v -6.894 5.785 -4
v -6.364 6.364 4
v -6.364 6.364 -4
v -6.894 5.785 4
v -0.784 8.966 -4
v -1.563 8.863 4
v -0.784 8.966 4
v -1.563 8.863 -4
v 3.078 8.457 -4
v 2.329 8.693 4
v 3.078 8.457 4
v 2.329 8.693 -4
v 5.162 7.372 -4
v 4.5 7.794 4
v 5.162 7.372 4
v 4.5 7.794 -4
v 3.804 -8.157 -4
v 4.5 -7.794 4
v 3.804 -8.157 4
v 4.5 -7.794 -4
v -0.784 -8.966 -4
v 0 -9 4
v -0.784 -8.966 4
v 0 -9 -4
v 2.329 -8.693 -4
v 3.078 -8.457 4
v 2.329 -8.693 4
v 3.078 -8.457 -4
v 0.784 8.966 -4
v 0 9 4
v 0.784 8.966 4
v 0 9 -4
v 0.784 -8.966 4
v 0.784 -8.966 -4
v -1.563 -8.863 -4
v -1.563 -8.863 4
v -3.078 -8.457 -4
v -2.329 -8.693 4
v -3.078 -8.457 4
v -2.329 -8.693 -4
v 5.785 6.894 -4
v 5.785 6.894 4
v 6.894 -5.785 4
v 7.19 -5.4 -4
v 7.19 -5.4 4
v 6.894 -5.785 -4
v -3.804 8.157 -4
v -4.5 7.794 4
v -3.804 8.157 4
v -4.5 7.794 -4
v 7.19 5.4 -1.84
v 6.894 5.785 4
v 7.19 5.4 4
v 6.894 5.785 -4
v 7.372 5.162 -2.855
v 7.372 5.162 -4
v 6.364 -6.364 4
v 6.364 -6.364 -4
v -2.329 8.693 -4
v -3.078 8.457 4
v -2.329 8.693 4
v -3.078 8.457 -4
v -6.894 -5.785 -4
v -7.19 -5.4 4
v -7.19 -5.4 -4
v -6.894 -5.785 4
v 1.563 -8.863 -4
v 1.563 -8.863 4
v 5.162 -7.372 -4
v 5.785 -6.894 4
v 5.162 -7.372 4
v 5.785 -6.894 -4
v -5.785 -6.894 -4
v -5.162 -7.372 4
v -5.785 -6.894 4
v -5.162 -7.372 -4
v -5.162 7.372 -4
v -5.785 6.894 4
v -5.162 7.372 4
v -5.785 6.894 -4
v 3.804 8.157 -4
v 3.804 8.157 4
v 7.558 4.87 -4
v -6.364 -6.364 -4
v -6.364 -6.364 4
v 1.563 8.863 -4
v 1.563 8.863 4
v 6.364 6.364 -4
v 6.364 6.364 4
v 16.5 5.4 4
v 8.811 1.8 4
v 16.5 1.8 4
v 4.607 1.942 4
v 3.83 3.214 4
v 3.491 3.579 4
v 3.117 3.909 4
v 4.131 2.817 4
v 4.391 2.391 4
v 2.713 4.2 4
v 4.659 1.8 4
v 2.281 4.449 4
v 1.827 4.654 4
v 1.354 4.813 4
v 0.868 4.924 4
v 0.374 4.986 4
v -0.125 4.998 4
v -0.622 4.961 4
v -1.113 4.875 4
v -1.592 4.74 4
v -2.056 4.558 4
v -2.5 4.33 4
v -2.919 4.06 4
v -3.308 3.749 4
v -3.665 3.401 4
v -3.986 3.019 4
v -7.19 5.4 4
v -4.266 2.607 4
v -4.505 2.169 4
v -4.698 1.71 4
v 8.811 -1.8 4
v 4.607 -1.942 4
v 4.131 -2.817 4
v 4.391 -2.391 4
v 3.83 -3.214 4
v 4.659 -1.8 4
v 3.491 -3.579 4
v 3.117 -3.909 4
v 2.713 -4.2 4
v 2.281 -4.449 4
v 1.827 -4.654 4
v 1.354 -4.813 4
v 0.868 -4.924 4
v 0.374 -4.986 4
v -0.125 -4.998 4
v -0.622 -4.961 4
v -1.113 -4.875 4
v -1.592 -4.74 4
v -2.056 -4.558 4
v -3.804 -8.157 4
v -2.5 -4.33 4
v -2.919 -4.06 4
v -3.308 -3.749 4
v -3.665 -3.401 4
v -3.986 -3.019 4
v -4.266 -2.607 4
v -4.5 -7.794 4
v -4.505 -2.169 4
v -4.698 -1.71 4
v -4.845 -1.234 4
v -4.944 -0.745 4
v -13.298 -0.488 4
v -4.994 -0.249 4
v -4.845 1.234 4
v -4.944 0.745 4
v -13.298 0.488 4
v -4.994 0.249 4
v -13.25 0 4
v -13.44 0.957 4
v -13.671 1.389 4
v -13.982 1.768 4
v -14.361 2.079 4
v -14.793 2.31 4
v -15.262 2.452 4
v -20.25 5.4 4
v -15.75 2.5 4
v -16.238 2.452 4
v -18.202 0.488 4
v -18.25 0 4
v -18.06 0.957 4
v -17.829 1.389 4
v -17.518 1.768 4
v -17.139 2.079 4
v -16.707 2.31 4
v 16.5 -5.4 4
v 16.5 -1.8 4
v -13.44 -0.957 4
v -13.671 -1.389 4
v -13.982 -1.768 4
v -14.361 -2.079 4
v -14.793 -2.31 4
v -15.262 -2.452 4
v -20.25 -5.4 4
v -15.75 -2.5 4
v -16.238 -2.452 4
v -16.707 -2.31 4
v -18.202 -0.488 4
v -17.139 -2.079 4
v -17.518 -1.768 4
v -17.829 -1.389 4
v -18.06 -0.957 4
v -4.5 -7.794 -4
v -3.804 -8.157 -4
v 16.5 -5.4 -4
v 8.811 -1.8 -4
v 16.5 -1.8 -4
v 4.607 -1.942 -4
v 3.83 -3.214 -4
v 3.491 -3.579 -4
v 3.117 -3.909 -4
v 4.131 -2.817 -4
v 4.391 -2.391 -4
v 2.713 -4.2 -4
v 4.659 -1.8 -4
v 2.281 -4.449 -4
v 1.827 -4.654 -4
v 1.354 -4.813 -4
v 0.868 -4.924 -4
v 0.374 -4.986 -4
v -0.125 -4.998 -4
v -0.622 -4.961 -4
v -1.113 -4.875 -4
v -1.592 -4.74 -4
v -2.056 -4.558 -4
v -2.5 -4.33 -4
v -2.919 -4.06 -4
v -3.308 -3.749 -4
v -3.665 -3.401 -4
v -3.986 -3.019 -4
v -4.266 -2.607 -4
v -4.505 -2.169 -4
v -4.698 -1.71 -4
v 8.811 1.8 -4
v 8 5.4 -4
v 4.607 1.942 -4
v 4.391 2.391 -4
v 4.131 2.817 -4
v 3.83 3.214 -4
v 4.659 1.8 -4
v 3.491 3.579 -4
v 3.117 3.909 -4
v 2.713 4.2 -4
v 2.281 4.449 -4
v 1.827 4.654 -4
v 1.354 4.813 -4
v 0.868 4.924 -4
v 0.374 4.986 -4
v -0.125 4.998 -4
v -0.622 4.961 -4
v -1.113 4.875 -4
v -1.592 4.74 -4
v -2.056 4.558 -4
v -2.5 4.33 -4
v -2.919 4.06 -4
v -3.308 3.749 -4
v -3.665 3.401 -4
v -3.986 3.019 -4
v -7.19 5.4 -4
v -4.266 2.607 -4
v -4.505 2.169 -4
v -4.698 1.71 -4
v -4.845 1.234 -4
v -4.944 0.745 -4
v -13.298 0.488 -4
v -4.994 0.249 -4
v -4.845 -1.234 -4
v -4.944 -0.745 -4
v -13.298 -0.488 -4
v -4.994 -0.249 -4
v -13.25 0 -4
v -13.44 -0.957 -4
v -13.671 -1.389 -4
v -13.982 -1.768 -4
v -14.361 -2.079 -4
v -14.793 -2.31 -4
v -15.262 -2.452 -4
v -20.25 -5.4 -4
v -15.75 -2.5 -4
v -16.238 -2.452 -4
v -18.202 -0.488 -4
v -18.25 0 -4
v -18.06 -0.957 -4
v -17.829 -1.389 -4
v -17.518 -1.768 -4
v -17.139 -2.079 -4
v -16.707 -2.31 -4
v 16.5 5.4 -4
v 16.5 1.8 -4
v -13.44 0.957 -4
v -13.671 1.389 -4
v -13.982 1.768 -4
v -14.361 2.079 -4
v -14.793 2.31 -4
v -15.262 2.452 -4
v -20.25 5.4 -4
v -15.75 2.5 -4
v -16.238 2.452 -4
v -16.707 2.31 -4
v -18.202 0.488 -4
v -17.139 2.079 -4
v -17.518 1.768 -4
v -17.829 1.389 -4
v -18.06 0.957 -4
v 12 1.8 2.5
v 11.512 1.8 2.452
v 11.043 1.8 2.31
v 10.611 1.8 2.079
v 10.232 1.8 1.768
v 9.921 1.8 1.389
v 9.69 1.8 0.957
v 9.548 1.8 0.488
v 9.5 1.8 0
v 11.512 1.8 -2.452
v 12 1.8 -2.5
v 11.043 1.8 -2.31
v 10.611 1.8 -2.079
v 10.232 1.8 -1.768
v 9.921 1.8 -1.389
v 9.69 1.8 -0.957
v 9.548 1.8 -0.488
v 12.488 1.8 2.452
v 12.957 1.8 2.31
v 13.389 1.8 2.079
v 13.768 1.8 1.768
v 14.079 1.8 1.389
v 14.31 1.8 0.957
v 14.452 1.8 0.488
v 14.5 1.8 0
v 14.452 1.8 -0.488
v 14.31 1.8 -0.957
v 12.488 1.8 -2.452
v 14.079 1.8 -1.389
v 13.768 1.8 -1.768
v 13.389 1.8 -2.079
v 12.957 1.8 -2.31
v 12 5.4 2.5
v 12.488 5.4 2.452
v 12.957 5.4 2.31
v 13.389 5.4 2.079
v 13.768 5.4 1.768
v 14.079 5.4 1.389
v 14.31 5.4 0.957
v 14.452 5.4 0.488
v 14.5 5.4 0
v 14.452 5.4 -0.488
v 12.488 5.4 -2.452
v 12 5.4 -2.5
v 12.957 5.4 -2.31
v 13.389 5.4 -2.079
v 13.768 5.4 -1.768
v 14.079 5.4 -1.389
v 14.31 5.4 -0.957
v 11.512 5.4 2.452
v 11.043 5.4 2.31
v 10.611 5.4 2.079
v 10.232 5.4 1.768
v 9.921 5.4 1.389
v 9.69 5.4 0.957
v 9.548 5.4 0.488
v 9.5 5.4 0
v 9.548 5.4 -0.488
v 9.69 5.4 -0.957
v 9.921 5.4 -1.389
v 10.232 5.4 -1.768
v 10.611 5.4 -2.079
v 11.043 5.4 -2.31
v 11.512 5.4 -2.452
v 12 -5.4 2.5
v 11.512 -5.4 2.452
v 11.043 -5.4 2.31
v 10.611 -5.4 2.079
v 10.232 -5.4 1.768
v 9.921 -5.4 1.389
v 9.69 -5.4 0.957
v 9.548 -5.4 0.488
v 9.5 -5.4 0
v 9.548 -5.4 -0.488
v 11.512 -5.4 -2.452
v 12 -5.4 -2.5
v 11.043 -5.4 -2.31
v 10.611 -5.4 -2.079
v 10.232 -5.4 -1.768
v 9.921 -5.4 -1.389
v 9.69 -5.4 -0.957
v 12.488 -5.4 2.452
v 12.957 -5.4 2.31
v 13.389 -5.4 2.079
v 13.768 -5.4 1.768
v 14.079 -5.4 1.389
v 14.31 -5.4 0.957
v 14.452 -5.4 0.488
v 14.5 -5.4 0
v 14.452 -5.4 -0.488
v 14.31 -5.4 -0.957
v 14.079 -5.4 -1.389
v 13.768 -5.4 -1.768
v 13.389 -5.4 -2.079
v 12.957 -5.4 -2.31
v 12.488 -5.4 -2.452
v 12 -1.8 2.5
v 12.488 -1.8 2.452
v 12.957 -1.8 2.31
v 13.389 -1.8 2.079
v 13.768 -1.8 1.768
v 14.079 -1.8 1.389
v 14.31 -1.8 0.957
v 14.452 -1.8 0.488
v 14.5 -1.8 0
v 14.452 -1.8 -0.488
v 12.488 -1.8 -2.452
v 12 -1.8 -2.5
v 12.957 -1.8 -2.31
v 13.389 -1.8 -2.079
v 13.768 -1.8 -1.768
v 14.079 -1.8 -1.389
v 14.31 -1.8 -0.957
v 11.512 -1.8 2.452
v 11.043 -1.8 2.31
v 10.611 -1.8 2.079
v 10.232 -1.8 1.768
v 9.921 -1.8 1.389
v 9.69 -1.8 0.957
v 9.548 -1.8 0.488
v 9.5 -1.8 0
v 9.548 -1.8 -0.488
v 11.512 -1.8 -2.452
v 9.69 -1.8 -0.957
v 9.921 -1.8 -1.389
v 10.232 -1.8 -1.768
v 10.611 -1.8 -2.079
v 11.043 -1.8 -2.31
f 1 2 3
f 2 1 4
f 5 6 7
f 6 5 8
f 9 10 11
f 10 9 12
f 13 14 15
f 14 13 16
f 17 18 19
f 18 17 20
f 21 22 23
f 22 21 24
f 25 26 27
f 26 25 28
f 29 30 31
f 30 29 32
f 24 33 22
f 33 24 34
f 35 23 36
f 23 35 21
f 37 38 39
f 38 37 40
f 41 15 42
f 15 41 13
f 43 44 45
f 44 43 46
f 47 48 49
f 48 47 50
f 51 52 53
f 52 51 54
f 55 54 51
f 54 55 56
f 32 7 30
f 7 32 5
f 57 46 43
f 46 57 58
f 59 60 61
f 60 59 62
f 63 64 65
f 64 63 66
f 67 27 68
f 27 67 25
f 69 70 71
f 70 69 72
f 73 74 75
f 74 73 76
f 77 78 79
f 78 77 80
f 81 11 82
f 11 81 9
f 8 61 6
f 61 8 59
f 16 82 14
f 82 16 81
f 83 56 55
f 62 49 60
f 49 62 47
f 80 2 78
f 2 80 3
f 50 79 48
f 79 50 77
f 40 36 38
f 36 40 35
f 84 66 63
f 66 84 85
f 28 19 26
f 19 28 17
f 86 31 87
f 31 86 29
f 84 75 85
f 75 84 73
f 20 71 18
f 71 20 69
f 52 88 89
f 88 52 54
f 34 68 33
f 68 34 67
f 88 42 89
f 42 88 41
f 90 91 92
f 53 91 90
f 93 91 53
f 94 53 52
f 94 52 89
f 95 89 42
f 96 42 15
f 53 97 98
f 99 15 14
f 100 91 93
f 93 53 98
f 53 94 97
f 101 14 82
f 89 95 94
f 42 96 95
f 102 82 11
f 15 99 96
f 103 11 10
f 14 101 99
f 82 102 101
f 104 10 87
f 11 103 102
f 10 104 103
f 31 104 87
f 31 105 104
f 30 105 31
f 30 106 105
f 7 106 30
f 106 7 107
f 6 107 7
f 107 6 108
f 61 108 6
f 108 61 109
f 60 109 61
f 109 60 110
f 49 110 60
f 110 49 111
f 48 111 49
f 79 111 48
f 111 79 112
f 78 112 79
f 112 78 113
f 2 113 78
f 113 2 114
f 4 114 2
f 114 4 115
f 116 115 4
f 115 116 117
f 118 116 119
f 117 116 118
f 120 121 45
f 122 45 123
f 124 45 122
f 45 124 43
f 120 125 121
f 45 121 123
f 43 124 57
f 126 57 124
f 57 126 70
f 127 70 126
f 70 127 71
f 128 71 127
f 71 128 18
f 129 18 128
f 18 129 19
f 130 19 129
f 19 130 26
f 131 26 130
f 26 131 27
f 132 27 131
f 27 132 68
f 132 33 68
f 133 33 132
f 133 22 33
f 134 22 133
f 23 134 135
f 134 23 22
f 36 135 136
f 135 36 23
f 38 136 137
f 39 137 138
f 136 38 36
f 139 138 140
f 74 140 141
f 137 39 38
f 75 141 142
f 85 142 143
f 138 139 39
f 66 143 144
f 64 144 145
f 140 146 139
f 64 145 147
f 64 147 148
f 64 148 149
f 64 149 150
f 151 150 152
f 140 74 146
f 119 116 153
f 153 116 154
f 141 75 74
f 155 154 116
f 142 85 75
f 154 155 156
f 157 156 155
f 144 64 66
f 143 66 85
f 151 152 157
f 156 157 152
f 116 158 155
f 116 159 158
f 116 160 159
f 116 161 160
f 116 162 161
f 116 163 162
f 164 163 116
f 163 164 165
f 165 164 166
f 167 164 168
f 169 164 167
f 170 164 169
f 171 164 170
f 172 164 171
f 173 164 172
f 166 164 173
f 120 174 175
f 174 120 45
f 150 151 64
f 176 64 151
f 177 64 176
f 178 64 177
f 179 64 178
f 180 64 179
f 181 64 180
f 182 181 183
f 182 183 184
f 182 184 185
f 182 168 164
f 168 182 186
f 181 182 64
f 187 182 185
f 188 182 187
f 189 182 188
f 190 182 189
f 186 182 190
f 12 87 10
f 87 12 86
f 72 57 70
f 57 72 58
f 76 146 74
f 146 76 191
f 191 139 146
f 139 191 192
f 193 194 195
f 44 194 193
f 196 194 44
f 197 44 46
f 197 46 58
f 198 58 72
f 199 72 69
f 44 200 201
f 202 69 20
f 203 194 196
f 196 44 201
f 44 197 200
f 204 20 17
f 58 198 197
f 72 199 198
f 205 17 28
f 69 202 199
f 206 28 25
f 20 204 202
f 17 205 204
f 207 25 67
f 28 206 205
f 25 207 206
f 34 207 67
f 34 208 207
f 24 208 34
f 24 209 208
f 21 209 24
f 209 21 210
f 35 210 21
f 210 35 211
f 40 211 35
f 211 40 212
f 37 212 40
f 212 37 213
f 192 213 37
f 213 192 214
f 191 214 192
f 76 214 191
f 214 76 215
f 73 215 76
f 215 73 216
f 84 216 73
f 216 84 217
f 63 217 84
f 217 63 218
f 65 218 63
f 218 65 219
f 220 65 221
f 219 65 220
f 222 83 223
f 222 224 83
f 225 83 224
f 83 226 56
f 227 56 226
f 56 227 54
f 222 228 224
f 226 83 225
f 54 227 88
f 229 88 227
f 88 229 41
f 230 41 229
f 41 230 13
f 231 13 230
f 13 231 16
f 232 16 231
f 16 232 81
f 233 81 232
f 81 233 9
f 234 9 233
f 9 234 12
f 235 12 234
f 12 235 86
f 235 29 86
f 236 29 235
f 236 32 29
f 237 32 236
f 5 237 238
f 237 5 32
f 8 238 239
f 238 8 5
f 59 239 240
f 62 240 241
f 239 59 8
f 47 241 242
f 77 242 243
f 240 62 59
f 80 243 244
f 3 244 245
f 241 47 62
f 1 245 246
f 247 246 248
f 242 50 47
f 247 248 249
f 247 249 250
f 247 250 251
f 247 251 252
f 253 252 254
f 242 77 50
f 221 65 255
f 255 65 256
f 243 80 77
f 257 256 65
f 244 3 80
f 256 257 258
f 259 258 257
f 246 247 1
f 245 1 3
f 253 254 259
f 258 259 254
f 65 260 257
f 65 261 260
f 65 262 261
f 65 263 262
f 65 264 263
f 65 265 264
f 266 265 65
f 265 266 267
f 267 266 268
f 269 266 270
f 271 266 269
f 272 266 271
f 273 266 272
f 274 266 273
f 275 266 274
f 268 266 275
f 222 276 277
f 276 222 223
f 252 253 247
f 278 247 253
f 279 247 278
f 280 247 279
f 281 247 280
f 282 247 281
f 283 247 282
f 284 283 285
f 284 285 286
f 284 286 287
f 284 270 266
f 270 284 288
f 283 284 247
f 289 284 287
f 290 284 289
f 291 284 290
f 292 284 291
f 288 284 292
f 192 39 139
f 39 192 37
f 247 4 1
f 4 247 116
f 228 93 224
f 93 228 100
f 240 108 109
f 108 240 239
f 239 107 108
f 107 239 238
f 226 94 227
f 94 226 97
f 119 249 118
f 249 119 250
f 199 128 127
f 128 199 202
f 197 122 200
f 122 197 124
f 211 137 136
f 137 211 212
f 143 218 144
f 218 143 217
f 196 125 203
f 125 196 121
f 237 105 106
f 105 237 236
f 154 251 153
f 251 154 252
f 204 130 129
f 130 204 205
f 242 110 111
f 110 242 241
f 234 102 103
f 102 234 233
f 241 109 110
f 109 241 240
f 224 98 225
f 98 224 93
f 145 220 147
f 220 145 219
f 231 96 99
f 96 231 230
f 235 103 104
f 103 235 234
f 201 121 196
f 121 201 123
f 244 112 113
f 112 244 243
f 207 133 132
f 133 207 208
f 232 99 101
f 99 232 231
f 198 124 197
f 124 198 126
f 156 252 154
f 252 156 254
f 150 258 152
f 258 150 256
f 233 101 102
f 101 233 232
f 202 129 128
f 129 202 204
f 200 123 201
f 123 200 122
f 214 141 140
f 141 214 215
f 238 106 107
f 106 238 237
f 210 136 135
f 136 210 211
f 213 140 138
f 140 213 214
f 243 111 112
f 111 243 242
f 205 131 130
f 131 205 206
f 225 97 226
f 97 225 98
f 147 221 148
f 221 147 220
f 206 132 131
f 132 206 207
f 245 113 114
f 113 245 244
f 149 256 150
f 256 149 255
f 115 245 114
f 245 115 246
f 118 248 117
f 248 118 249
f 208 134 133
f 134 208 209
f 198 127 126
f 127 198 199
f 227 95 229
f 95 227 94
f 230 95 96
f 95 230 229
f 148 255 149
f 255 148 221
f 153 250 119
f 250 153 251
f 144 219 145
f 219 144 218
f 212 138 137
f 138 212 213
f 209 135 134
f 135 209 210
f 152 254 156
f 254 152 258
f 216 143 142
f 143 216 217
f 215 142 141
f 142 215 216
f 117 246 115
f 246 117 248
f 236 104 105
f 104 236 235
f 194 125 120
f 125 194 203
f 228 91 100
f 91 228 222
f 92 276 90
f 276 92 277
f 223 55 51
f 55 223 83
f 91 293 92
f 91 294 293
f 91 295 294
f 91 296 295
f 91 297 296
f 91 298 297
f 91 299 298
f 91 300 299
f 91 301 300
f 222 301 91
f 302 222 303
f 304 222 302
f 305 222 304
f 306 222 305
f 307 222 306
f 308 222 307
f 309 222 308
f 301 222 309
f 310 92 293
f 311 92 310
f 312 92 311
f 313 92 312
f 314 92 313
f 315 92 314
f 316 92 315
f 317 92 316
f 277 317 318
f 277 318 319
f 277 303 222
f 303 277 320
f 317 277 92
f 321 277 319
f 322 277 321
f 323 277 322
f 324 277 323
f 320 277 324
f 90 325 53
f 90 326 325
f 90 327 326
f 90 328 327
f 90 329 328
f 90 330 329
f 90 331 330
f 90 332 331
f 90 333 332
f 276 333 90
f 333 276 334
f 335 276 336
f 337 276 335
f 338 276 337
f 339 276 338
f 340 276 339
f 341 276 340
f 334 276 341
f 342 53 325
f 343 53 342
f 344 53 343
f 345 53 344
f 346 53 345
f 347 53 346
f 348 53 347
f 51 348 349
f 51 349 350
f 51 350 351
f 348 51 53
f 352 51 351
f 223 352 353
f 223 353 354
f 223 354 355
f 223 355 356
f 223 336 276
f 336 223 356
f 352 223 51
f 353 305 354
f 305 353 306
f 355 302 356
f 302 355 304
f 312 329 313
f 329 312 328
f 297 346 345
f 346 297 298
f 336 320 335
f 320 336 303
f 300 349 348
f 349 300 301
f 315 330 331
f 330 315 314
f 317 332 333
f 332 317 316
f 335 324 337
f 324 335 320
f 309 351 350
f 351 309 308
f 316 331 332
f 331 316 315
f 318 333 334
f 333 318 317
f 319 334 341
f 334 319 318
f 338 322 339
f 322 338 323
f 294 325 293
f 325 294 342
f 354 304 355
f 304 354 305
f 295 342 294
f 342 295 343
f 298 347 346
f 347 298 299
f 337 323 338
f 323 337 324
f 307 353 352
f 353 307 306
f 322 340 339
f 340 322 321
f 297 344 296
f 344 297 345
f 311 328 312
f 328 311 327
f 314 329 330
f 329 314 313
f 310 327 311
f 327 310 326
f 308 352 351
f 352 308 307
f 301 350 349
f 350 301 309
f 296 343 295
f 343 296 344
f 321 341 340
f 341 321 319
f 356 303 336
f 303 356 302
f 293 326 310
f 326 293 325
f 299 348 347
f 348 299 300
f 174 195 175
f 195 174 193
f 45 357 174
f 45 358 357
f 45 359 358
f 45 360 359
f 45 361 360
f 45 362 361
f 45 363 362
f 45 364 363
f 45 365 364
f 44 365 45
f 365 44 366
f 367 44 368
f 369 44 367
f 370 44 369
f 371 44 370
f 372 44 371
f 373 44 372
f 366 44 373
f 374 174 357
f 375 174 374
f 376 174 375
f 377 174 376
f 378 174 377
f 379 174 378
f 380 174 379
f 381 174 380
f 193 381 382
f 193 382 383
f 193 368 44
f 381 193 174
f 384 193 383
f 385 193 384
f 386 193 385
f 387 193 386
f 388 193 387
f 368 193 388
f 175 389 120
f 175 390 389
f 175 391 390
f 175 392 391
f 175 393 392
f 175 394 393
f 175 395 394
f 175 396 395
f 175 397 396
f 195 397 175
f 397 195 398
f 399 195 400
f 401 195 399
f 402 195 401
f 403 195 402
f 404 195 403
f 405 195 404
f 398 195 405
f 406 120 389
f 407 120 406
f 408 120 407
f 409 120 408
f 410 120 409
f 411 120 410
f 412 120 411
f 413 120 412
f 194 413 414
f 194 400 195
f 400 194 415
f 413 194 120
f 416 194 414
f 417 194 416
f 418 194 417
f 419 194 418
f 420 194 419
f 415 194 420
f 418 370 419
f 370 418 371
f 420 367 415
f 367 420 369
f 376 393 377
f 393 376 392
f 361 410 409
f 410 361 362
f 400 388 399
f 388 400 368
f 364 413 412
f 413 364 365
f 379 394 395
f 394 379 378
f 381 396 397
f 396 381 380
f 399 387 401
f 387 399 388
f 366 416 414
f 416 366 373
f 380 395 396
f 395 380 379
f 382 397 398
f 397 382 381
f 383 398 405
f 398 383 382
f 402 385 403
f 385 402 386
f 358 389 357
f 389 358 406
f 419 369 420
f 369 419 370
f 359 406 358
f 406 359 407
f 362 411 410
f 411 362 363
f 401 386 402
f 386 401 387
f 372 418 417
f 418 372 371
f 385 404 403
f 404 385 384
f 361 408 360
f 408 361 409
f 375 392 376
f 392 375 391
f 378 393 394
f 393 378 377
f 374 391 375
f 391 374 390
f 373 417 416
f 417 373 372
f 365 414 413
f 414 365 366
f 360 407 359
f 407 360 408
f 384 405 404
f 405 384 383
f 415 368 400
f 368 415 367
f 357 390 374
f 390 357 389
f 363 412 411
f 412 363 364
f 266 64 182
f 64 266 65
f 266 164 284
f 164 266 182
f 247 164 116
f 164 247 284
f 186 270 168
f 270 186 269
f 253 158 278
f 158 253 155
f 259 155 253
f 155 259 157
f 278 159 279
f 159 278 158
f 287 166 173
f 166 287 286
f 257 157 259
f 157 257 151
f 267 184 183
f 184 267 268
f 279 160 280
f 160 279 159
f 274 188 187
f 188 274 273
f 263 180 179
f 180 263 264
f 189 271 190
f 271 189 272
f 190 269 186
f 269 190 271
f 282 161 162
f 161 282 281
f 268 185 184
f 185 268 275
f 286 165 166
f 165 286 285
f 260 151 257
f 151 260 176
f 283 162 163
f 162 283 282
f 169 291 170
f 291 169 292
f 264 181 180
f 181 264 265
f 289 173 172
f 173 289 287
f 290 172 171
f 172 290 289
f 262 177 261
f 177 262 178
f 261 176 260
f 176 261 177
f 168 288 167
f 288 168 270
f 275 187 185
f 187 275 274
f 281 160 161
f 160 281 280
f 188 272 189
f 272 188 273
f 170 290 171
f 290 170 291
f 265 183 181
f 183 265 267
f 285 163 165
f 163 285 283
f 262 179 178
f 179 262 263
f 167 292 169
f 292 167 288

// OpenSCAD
// Global resolution
$fs = 0.5;  // Don't generate smaller facets than 0.1 mm
$fa = 5;    // Don't generate larger angles than 5 degrees

sharpie = 5;
radiusOuter = 9;
height = 8;

penHolder();

module penHolder() {
    
    union() {
    union() {
        difference(){
            difference() {
                cylinder(height, radiusOuter, radiusOuter, true);
                translate([0,0,-0.5]) cylinder(height+2, sharpie, sharpie, true);
            }
            cutOut(radiusOuter/2,height);
        }
        translate([0,0,0]) clasps(radiusOuter/2,height);
    }
    translate([-radiusOuter*2.25,0,0]) handle(radiusOuter,height);
    }
}

//Should be large enough to allow some standard sized
//screw through- use two washers to tighten around pen
module clasps(radius,height) {
    union() {
       translate([0,2*radius/5,0]) sideWall(radius,height);
       translate([0,-6*radius/5,0]) sideWall(radius,height);
    }
}

module handle(radius,height) {
CutPoints = [
  [  0,  -3*radius/5,  -height/2 ],  //0
  [ radius*1.5,  -3*radius/5,  -height/2 ],  //1
  [ radius*1.5,  3*radius/5,  -height/2 ],  //2
  [  0,  3*radius/5,  -height/2 ],  //3
  [  0,  -3*radius/5,  height/2 ],  //4
  [ radius*1.5,  -3*radius/5,  height/2 ],  //5
  [ radius*1.5,  3*radius/5,  height/2 ],  //6
  [  0,  3*radius/5,  height/2 ]]; //7
  
CutFaces = [
  [0,1,2,3],  // bottom
  [4,5,1,0],  // front
  [7,6,5,4],  // top
  [5,6,2,1],  // right
  [6,7,3,2],  // back
  [7,4,0,3]]; // left

difference() { 
    polyhedron(CutPoints, CutFaces);
    translate([radius*0.5,0,0]) cylinder(height*2, 2.5, 2.5, true);
}
}

module sideWall(radius,height) {
WallPoints = [
  [  sharpie,  0,  -height/2 ],  //0
  [ radius*3+3,  0,  -height/2 ],  //1
  [ radius*3+3,  radius*4/5,  -height/2 ],  //2
  [  sharpie+3,  radius*4/5,  -height/2 ],  //3
  [  sharpie,  0,  height/2 ],  //4
  [ radius*3+3,  0,  height/2 ],  //5
  [ radius*3+3,  radius*4/5,  height/2 ],  //6
  [  sharpie,  radius*4/5,  height/2 ]]; //7
  
WallFaces = [
  [0,1,2,3],  // bottom
  [4,5,1,0],  // front
  [7,6,5,4],  // top
  [5,6,2,1],  // right
  [6,7,3,2],  // back
  [7,4,0,3]]; // left
  
difference() {  
    polyhedron(WallPoints, WallFaces);
    rotate([90,0,0]) translate([radiusOuter+3,0,-2*radius/5]) cylinder(height*2, 2.5, 2.5, true);
}
}

module cutOut(radius,height) {
CutPoints = [
  [  0,  -2*radius/5,  -height ],  //0
  [ radius*2,  -2*radius/5,  -height ],  //1
  [ radius*2,  2*radius/5,  -height ],  //2
  [  0,  2*radius/5,  -height ],  //3
  [  0,  -2*radius/5,  height ],  //4
  [ radius*2,  -2*radius/5,  height ],  //5
  [ radius*2,  2*radius/5,  height ],  //6
  [  0,  2*radius/5,  height ]]; //7
  
CutFaces = [
  [0,1,2,3],  // bottom
  [4,5,1,0],  // front
  [7,6,5,4],  // top
  [5,6,2,1],  // right
  [6,7,3,2],  // back
  [7,4,0,3]]; // left
    
polyhedron(CutPoints, CutFaces);
}
